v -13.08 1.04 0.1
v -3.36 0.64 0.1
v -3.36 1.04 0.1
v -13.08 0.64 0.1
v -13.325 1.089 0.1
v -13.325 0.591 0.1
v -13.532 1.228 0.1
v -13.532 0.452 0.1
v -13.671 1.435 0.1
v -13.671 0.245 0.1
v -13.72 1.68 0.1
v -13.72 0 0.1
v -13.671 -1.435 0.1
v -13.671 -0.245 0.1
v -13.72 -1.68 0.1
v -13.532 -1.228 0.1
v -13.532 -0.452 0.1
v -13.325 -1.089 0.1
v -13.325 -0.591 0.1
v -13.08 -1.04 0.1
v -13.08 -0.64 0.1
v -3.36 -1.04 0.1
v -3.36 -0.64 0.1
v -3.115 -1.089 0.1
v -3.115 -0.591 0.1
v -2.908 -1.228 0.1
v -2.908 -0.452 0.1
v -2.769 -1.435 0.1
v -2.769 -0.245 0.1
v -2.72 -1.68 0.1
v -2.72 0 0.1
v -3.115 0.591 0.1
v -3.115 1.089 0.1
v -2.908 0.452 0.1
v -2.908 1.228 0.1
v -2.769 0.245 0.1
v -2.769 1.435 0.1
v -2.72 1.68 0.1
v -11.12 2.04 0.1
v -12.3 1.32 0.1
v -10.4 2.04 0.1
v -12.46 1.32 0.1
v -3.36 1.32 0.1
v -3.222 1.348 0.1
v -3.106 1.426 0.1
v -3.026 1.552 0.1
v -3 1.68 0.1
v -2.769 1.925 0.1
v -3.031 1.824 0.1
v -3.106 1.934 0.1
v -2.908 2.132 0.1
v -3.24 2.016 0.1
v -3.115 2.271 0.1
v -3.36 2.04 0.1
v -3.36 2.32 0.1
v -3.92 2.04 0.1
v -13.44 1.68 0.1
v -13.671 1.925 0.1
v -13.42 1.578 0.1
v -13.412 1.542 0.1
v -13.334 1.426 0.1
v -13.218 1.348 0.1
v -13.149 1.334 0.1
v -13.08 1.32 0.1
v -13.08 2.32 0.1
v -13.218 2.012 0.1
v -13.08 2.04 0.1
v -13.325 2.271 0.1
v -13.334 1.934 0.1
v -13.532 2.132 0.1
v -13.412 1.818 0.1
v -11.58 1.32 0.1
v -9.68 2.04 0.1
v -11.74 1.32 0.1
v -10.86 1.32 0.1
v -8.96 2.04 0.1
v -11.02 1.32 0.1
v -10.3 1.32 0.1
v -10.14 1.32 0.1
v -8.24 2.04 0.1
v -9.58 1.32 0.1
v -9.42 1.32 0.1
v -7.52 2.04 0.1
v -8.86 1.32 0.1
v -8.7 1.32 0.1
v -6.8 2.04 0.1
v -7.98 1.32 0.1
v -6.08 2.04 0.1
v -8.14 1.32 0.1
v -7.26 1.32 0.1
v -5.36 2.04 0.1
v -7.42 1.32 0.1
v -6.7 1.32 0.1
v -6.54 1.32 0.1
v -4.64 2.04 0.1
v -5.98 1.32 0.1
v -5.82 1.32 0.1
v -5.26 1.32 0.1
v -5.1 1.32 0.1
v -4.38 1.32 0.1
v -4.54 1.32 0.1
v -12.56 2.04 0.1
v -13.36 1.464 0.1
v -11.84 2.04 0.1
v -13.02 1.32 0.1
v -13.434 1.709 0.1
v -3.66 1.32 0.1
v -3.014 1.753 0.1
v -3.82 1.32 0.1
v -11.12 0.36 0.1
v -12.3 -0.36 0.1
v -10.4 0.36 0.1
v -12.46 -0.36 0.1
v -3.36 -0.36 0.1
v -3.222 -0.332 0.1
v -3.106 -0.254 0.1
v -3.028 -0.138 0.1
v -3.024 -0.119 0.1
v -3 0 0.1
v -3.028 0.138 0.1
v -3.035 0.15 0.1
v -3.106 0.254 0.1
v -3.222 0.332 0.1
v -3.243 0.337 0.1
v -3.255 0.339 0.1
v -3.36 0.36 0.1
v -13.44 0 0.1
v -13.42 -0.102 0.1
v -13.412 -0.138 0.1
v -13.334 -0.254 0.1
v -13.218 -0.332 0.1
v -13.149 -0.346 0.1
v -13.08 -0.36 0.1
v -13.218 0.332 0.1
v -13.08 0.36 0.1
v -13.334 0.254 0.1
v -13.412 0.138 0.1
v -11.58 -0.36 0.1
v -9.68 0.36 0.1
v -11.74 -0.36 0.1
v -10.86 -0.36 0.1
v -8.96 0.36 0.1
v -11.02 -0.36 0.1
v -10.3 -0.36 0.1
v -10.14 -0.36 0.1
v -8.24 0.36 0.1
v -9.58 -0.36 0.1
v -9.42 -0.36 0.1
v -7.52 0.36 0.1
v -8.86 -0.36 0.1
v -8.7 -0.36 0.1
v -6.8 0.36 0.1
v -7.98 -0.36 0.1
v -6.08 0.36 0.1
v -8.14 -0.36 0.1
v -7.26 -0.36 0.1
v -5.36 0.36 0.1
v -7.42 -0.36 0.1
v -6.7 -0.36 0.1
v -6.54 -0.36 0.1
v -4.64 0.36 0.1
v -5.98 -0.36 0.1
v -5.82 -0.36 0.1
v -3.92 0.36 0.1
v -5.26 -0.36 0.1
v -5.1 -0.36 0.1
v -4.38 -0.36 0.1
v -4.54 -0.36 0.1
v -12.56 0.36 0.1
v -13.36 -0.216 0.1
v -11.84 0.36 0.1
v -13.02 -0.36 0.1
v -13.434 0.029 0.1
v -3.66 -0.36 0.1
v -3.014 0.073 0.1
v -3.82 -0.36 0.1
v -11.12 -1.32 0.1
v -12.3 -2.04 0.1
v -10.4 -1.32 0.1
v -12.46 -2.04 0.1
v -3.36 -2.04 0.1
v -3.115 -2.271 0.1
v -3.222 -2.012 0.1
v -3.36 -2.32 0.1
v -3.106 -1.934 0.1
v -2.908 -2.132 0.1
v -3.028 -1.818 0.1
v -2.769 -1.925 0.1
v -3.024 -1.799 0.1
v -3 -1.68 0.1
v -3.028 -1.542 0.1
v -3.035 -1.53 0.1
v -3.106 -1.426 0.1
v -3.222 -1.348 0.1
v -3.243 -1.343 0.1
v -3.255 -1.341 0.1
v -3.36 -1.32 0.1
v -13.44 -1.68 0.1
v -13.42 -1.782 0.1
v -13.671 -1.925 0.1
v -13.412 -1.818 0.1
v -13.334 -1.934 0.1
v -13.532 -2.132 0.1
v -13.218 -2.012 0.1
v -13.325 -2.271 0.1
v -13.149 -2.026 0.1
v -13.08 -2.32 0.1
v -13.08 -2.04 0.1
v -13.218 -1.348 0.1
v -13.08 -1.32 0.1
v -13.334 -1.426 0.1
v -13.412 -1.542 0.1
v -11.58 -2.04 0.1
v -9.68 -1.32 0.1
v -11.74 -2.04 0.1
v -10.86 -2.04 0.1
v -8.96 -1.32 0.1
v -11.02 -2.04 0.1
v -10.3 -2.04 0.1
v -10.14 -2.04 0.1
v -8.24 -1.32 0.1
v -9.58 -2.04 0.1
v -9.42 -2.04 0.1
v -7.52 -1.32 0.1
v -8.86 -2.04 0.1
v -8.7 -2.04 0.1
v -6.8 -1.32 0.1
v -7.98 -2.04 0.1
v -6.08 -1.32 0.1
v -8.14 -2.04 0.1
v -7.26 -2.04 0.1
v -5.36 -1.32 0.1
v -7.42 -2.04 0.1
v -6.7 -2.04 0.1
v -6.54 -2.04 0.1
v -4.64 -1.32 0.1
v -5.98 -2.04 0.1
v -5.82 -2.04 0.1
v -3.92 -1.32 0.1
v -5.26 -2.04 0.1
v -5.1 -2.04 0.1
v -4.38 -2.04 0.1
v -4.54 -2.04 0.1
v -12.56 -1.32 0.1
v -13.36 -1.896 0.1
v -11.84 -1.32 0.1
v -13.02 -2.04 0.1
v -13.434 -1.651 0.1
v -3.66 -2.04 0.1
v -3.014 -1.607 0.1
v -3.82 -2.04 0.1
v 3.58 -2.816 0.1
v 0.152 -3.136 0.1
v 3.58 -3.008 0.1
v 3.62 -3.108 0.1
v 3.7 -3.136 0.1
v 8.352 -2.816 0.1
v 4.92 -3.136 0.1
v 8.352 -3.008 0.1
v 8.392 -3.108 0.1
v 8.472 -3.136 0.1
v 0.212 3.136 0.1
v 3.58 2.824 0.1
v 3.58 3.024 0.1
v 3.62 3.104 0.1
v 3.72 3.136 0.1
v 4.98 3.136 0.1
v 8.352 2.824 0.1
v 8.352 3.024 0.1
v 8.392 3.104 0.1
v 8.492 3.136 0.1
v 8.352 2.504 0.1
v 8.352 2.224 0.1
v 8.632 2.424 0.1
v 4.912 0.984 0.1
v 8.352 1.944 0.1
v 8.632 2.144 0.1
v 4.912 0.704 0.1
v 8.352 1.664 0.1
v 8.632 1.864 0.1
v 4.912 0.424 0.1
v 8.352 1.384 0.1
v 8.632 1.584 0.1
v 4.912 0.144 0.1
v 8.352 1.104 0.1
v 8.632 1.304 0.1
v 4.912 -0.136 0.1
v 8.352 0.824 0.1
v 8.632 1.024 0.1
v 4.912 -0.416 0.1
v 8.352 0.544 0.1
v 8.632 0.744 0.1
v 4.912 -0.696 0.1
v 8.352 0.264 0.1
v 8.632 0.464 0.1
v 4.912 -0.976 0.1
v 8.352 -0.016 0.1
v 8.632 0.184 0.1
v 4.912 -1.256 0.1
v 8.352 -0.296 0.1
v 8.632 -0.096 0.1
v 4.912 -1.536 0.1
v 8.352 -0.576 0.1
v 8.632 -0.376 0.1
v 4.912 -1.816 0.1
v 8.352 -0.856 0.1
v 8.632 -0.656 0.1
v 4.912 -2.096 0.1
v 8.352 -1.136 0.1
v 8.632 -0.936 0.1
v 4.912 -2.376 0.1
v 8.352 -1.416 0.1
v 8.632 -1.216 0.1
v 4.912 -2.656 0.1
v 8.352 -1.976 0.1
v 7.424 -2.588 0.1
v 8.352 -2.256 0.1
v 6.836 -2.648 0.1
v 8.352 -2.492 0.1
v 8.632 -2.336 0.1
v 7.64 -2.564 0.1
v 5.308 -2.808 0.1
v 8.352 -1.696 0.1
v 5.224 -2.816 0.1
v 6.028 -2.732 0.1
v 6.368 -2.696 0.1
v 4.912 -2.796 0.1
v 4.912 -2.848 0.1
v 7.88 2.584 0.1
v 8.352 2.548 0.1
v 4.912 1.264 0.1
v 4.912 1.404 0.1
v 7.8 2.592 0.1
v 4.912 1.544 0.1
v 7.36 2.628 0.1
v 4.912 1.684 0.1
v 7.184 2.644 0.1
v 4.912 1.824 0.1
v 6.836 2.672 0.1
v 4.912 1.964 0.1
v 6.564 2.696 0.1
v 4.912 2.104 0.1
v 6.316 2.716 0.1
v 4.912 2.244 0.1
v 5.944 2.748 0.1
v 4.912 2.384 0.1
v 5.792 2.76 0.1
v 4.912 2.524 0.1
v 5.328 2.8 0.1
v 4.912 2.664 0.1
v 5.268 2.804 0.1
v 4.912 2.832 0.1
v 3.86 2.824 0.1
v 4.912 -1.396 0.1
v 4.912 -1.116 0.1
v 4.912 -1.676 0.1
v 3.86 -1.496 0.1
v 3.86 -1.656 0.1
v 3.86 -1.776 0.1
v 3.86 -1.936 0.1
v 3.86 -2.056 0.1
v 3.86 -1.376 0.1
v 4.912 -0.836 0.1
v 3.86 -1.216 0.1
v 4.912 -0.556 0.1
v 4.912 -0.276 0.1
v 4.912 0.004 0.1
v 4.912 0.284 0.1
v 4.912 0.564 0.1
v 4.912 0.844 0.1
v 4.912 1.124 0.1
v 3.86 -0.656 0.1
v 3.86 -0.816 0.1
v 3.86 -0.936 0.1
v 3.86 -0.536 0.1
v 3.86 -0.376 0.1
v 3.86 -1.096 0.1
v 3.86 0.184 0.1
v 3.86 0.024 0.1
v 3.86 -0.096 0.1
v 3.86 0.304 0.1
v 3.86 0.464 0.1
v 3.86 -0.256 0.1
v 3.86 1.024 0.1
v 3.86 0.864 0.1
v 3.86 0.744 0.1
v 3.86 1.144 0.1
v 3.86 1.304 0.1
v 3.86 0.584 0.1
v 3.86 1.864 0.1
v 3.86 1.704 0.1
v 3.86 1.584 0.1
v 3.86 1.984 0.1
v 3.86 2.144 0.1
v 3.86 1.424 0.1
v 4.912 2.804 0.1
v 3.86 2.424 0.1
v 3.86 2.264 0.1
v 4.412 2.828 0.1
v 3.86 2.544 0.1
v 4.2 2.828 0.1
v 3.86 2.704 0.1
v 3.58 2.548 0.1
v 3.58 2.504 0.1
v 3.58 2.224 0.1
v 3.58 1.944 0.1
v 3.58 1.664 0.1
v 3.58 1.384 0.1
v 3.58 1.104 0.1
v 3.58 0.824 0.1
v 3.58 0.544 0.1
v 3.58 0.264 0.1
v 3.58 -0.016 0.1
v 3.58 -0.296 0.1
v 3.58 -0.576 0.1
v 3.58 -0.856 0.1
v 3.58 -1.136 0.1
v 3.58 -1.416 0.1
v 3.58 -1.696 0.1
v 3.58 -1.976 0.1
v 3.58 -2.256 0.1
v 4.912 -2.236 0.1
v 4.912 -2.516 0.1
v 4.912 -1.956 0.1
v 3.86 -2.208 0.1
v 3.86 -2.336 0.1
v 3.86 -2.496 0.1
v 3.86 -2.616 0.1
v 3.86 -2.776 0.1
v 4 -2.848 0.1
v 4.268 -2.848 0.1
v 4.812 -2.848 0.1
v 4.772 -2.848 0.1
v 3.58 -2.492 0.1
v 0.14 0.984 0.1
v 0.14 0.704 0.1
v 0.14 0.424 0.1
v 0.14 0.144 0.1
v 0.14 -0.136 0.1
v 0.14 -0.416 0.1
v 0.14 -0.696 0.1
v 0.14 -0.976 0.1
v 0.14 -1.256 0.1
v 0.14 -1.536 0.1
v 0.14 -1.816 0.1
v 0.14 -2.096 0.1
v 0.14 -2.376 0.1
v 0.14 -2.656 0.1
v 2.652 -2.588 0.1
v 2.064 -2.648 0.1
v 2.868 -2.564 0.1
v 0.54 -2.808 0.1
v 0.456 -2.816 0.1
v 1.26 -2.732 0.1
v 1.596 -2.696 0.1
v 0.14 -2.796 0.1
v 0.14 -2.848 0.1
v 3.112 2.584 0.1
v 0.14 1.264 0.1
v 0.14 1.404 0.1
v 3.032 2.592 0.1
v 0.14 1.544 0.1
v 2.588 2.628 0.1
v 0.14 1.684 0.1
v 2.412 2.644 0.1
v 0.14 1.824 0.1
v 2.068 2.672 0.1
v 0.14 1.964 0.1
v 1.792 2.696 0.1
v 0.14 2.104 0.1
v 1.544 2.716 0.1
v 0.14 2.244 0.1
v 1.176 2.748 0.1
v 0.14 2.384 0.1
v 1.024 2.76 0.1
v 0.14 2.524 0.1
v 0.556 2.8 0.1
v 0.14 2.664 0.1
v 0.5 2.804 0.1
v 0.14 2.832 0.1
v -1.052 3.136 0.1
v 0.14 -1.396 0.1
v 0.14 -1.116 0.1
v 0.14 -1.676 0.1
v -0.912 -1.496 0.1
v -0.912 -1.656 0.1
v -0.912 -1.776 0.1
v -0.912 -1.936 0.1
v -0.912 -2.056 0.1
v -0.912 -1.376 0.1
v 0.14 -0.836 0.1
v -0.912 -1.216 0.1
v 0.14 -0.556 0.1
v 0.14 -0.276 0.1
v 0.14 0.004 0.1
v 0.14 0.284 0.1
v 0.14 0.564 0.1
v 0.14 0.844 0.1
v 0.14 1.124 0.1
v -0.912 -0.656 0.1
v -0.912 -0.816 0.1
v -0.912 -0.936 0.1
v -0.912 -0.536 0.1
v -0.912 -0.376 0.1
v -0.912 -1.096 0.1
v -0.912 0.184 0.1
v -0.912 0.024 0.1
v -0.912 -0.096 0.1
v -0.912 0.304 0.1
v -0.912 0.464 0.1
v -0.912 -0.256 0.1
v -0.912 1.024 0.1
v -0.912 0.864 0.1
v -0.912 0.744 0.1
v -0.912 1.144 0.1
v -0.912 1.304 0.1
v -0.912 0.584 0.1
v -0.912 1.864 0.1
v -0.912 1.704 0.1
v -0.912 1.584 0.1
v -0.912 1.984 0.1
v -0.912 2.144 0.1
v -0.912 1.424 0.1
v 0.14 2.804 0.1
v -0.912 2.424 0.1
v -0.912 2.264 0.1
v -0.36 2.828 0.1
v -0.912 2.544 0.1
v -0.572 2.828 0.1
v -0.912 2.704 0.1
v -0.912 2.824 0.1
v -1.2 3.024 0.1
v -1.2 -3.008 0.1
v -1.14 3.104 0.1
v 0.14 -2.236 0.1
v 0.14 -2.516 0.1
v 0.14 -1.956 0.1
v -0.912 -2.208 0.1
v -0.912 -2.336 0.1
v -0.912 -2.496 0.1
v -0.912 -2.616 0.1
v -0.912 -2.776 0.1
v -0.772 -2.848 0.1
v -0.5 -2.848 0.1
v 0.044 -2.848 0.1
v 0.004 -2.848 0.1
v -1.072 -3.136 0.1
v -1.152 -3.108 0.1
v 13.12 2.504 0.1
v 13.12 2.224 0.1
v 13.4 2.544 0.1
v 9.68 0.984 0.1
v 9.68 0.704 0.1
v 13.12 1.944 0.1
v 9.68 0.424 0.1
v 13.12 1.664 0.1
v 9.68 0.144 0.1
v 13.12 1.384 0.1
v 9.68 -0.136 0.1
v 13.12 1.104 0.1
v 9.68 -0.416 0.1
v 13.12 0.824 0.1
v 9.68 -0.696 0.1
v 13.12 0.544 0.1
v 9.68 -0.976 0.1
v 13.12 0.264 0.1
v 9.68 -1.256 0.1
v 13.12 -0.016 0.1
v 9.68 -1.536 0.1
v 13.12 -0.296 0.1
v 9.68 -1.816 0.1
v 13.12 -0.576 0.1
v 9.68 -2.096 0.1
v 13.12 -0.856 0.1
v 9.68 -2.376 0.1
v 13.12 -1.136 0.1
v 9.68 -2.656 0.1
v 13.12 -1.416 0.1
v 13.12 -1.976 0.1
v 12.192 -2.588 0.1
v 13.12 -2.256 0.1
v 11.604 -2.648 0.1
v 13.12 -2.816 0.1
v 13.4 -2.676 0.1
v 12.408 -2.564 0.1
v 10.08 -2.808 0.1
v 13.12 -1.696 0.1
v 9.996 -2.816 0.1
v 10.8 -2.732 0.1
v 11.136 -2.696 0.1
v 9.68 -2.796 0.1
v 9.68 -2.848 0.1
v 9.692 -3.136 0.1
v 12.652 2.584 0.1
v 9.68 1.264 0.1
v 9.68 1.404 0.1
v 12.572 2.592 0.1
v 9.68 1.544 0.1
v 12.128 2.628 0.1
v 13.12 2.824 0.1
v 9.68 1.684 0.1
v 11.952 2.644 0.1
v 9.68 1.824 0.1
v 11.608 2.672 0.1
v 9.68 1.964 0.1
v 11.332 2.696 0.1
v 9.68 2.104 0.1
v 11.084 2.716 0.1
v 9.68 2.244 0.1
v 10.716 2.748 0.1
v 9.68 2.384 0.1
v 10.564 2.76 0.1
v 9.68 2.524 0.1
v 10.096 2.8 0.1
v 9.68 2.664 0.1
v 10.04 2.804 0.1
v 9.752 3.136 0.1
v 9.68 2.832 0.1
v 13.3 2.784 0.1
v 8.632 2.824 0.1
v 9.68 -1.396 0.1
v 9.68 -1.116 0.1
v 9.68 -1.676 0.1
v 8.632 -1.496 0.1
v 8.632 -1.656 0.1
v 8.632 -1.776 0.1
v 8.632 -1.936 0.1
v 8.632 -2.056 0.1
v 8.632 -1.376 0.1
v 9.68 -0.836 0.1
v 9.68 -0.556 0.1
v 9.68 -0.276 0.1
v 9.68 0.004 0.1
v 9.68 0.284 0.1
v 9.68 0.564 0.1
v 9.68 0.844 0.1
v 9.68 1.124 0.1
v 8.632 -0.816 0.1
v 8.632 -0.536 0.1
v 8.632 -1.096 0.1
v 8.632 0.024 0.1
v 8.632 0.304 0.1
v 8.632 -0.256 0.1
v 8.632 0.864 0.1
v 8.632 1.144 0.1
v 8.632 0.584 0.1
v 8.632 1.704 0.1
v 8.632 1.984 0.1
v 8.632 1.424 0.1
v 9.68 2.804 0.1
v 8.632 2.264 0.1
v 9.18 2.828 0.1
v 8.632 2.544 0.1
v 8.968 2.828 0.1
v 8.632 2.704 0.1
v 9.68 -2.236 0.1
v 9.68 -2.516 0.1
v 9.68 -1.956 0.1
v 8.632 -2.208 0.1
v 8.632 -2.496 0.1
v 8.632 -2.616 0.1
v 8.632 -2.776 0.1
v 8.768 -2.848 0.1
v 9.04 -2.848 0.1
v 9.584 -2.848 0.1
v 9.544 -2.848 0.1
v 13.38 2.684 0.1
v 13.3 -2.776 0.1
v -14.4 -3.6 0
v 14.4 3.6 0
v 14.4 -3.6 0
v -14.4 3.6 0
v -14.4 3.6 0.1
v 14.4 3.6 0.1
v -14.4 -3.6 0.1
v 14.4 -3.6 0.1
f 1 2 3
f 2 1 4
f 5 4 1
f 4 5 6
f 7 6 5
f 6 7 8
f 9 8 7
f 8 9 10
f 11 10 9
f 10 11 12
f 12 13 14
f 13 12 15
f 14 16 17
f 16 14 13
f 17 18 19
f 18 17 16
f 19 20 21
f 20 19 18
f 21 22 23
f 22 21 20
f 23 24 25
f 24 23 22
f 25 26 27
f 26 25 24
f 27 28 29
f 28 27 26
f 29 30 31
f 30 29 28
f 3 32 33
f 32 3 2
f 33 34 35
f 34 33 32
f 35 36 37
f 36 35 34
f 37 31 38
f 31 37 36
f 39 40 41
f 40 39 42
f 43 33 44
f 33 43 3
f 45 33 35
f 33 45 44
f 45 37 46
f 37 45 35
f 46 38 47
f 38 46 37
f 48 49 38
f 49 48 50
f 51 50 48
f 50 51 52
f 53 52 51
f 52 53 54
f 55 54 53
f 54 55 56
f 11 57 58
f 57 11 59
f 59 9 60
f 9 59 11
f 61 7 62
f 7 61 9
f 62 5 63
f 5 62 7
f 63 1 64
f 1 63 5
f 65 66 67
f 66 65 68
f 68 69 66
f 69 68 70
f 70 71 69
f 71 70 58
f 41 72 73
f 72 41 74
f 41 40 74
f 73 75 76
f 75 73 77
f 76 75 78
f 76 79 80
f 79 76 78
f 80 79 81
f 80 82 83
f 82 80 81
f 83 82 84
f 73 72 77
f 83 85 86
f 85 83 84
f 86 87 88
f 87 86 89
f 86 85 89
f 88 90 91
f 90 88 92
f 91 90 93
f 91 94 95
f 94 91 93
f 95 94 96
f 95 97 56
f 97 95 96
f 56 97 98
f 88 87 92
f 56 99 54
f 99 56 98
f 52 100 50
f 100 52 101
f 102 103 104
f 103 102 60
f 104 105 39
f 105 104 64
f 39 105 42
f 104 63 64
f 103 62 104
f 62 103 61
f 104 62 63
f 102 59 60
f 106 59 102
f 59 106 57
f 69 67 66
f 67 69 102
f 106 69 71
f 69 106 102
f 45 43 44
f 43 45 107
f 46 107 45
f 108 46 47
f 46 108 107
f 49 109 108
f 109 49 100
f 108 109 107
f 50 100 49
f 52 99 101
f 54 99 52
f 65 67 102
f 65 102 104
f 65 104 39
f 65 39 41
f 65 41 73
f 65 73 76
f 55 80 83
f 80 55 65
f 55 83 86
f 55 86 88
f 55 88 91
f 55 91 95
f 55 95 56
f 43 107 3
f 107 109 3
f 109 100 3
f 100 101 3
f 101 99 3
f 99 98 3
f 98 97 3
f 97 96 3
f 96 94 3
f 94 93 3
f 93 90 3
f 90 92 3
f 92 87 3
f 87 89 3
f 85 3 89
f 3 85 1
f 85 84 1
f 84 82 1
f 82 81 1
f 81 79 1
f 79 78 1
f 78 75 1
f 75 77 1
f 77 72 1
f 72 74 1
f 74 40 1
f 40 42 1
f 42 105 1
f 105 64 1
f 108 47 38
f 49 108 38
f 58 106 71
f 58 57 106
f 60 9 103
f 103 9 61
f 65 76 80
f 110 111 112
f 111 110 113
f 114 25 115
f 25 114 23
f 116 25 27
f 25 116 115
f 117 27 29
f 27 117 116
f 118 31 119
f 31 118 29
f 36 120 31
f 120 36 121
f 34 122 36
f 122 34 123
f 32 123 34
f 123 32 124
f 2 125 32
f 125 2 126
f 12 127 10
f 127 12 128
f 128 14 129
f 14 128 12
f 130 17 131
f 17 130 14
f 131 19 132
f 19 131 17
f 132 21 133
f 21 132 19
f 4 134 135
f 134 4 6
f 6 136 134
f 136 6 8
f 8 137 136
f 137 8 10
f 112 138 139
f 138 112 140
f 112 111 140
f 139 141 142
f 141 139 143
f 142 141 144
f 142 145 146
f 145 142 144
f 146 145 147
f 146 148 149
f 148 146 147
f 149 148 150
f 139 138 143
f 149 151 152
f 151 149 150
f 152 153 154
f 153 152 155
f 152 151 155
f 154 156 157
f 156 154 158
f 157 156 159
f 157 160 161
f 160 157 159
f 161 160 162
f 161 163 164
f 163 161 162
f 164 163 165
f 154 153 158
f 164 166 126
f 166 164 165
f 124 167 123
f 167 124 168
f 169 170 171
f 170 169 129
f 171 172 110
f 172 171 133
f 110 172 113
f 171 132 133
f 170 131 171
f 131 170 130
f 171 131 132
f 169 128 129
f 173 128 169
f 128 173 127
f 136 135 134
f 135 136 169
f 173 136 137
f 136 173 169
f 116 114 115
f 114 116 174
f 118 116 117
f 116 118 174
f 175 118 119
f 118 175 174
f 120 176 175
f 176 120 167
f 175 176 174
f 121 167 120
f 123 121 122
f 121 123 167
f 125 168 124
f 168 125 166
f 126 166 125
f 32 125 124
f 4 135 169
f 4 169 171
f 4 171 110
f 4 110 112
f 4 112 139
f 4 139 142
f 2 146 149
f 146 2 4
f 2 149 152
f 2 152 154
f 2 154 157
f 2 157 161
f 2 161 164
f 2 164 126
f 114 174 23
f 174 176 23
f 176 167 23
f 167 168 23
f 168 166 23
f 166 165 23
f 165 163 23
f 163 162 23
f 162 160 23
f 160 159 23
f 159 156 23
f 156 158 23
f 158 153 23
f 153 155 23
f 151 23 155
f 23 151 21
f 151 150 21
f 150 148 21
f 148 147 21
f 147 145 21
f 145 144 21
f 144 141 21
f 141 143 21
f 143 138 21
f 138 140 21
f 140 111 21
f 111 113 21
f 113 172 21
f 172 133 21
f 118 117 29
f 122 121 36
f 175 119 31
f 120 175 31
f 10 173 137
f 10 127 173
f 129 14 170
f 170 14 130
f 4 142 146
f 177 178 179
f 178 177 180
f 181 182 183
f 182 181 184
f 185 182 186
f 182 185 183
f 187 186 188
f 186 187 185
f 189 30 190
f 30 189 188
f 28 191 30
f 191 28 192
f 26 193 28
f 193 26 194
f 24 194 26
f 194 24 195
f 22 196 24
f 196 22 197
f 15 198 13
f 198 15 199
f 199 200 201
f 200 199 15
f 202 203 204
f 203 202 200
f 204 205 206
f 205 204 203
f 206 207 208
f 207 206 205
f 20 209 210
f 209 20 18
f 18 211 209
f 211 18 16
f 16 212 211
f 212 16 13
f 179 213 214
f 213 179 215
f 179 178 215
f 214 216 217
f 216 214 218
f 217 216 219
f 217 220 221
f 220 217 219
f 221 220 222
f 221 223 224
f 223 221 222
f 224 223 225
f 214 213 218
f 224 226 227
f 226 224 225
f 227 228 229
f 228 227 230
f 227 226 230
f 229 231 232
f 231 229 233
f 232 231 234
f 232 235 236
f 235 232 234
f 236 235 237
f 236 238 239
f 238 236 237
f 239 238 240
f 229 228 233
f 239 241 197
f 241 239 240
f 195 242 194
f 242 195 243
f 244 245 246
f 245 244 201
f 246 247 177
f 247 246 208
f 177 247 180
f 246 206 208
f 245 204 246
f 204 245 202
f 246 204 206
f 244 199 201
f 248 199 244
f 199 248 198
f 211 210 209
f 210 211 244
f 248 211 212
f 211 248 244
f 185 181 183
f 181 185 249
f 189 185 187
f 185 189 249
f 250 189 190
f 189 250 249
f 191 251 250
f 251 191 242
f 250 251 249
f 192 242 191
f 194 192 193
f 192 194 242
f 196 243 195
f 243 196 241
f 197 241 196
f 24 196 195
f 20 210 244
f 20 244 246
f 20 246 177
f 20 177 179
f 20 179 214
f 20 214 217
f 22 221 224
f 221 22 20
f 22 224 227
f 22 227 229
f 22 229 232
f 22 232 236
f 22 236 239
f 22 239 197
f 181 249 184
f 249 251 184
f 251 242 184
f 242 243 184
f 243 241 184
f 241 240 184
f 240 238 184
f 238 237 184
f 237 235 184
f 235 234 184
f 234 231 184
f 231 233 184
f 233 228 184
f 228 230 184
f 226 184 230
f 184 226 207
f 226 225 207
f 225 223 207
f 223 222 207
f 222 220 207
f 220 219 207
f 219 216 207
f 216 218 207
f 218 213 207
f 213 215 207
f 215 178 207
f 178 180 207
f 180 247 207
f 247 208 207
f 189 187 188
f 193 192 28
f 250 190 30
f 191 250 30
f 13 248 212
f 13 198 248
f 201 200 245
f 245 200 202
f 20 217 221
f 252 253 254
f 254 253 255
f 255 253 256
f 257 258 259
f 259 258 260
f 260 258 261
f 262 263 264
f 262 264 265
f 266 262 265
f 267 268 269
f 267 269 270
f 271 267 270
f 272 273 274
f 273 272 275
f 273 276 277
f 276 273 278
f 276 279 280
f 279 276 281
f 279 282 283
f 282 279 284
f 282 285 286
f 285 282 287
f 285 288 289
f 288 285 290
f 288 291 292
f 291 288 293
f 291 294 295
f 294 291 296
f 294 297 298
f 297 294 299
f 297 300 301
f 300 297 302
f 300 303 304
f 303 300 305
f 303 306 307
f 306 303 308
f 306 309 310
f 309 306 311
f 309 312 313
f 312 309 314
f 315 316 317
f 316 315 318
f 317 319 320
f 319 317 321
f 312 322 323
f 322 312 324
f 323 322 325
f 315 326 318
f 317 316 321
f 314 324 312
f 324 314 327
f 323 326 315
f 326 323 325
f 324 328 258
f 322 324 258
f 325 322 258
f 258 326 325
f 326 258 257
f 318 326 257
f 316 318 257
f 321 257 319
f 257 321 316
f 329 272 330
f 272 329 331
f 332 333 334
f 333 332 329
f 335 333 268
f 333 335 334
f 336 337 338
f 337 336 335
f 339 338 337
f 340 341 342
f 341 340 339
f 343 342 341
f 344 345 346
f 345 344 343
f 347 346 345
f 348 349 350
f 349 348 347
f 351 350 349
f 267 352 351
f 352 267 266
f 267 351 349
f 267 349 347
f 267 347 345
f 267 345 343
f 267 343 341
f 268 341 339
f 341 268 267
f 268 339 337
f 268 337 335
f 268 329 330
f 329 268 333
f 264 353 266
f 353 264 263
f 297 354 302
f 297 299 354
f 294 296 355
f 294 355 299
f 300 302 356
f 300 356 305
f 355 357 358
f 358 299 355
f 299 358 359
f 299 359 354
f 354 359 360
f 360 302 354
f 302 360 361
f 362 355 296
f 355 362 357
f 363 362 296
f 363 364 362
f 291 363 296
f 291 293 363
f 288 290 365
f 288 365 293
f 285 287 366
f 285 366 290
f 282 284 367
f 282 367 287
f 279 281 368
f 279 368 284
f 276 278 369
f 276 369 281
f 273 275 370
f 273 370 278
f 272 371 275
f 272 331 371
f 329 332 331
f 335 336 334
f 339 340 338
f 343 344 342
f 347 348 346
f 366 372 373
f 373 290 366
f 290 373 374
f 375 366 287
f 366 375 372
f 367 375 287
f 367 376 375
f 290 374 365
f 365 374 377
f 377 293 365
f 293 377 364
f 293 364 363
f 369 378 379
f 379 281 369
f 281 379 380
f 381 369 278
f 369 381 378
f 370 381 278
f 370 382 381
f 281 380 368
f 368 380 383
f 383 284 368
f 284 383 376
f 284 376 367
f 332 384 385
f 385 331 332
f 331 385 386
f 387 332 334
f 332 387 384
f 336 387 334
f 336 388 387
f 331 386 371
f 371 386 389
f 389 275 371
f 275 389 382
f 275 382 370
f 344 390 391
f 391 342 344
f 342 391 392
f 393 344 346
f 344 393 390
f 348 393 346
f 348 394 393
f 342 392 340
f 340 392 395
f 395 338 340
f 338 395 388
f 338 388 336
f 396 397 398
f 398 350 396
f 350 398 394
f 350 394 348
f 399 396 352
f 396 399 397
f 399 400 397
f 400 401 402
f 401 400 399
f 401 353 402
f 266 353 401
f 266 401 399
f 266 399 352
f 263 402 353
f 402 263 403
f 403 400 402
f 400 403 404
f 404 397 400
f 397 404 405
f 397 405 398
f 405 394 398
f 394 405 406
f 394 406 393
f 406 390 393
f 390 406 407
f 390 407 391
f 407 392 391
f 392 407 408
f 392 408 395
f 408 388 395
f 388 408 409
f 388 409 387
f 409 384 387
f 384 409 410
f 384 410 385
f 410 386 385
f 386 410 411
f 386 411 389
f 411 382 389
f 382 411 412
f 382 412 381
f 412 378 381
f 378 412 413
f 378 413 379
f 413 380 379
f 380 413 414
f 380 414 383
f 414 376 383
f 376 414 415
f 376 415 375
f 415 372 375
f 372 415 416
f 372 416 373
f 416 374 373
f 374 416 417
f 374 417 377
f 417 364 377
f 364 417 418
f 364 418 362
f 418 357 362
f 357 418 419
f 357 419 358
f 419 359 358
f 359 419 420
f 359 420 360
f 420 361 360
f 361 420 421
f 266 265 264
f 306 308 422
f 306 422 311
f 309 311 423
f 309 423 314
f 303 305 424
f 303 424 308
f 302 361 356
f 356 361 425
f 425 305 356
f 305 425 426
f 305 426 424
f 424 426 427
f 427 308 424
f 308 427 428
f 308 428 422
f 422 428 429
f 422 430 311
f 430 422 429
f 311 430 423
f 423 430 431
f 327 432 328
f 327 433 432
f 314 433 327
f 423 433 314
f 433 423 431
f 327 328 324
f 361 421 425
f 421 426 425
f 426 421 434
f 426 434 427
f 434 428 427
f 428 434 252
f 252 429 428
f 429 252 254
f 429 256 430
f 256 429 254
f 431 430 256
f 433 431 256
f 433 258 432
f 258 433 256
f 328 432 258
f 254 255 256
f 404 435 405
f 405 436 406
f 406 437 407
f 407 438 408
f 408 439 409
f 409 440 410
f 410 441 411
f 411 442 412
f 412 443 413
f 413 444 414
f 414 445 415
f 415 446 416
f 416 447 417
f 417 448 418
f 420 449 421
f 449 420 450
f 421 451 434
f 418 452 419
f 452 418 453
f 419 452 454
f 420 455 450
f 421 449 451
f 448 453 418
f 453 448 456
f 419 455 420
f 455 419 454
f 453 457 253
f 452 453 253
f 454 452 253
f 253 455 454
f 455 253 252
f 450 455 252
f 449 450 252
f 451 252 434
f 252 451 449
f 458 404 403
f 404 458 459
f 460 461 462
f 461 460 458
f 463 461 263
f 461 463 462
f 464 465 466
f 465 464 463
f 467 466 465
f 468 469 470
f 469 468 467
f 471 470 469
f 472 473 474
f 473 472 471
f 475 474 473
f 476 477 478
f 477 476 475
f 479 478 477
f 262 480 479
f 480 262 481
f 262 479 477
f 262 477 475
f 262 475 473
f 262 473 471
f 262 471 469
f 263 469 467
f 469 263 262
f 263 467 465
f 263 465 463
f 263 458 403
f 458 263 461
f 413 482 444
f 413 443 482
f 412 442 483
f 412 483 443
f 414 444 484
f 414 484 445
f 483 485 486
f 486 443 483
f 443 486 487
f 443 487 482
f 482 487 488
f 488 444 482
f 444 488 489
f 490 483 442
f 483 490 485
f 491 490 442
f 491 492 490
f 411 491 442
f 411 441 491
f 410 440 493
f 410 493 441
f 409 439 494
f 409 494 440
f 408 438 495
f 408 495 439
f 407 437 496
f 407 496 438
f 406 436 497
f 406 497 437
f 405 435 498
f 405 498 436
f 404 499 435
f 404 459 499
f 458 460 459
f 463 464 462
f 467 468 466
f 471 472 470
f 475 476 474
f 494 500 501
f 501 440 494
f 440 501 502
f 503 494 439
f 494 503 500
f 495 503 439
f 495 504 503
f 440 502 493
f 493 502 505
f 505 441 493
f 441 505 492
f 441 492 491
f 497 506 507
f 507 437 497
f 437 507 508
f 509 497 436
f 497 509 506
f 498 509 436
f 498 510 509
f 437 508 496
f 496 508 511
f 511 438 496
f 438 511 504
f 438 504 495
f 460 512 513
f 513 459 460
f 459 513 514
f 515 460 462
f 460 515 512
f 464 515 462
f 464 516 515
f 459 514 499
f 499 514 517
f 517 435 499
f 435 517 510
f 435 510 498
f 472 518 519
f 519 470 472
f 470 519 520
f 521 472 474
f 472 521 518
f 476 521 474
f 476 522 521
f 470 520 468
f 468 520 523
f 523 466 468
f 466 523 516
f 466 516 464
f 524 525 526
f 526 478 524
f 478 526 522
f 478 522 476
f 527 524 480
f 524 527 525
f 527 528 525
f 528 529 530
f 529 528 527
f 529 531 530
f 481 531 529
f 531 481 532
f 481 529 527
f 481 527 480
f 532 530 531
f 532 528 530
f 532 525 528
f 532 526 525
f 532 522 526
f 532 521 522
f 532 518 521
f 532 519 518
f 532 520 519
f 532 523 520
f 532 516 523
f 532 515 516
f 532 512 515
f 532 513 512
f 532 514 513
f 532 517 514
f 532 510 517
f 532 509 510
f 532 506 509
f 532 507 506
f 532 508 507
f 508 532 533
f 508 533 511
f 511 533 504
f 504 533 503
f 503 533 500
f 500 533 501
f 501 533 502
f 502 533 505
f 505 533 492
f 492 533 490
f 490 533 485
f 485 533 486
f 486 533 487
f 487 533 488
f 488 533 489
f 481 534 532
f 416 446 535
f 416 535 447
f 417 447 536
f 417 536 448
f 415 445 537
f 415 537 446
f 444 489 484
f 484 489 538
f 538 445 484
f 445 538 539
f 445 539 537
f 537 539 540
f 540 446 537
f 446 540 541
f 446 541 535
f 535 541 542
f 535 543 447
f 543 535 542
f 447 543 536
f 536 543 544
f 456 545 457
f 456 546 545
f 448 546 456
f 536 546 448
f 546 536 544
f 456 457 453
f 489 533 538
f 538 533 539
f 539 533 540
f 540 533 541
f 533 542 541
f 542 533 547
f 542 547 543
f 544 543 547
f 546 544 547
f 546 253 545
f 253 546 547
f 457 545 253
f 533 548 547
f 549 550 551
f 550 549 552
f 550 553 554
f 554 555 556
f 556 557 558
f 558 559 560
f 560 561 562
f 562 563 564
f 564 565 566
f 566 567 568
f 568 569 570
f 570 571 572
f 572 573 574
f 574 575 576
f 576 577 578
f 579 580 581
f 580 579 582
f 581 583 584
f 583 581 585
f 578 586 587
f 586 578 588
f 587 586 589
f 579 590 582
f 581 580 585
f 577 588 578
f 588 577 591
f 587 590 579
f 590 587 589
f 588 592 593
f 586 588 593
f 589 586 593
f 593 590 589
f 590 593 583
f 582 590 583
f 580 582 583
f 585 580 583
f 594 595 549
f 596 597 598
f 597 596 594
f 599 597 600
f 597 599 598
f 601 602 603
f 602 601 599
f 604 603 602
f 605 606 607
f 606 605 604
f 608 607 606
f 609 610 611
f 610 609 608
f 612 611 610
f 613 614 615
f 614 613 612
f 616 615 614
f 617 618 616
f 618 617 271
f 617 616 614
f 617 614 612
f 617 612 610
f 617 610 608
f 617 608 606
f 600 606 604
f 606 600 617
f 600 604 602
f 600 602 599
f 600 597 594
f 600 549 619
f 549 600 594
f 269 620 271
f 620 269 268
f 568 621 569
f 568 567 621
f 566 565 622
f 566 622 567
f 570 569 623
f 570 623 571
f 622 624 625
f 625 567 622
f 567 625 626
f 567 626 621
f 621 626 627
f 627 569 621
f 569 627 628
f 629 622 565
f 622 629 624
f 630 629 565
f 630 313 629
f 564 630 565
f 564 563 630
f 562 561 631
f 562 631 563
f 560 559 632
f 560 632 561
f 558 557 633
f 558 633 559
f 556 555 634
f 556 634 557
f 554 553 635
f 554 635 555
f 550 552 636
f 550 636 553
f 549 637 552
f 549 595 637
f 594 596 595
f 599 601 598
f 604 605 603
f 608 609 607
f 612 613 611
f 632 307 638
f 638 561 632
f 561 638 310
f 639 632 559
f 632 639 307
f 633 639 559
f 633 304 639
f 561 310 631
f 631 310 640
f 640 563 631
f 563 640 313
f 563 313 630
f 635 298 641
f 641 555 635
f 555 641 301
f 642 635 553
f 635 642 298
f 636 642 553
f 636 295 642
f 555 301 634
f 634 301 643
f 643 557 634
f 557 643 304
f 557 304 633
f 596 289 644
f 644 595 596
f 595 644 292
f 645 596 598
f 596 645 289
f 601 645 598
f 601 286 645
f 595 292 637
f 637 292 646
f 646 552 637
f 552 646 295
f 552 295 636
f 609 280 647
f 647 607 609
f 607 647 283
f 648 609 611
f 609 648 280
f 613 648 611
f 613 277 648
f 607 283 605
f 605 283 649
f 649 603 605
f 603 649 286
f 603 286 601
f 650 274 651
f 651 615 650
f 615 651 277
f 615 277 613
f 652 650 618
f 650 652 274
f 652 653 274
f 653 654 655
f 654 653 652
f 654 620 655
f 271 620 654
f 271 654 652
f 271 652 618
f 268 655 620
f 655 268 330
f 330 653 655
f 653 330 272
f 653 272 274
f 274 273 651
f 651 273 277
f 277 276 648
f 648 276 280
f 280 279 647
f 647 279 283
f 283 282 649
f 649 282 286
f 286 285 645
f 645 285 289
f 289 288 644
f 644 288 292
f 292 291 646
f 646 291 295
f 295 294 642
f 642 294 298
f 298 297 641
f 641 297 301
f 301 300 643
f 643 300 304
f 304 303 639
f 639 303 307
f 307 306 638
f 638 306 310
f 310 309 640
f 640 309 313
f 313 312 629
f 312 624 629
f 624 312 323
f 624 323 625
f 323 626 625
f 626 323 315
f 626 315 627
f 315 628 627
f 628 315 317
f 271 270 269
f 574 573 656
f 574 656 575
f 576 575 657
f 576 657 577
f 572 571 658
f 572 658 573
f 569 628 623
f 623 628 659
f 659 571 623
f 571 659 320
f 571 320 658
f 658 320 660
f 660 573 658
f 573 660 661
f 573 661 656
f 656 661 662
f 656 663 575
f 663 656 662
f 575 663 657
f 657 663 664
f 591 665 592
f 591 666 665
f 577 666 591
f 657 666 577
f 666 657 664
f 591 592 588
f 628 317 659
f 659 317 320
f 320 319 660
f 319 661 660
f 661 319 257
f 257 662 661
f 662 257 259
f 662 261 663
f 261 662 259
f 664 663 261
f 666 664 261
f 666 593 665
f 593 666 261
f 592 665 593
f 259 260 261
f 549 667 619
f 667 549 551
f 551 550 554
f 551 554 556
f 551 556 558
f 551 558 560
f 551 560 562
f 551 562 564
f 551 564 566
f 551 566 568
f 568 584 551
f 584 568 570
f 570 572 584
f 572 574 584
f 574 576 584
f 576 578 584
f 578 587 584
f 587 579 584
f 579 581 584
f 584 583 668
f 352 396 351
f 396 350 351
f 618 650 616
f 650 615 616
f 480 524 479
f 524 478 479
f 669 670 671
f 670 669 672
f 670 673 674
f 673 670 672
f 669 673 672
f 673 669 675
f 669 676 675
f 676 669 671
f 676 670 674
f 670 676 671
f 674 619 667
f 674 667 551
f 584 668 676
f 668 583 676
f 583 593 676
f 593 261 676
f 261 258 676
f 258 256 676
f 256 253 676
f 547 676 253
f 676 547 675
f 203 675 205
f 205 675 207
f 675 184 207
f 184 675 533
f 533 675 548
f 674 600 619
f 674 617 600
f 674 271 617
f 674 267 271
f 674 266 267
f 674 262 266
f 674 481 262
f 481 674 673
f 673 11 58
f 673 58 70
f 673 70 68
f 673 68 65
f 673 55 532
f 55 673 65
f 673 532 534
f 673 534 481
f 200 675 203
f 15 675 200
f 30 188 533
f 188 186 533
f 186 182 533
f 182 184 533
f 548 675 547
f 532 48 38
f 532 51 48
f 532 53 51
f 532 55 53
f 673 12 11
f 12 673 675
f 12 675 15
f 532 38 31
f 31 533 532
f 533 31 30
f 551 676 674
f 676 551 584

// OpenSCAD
use <../lib.scad>
use <../p/box5-12.scad>
use <s/4188571cs01.scad>
use <s/4188571cs02.scad>
function ldraw_lib__4188571c() = [
// 0 Sticker  0.9 x  3.6 with Vertical and Horizontal Grille
// 0 Name: 4188571c.dat
// 0 Author: Gerald Lasser [GeraldLasser]
// 0 !LDRAW_ORG Part UPDATE 2023-04
// 0 !LICENSE Licensed under CC BY 4.0 : see CAreadme.txt
// 
// 0 BFC CERTIFY CCW
  [0,"BFC","CERTIFY"],
  [0,"BFC","CCW"],
// 
// 0 !KEYWORDS Bricklink 10020stk01, Bricklink 10022stk01, Bricklink 10025stk01
// 0 !KEYWORDS Brickowl 672398, Brickowl 924347, Rebrickable 43822
// 0 !KEYWORDS Rebrickable 45443, Set 10020, Set 10022, Set 10025
// 
// 0 !HISTORY 2023-08-25 [OrionP] Official Update 2023-04
// 
// 
// 1 16 -20.55 -.25 0 1 0 0 0 1 0 0 0 1 s\4188571cs01.dat
  [1,16,-20.55,-.25,0,1,0,0,0,1,0,0,0,1, ldraw_lib__s__4188571cs01()],
// 1 16 15.5 -.25 0 1 0 0 0 1 0 0 0 1 s\4188571cs02.dat
  [1,16,15.5,-.25,0,1,0,0,0,1,0,0,0,1, ldraw_lib__s__4188571cs02()],
// 
// 1 16 0 -0.25 0 36 0 0 0 0.25 0 0 0 9 box5-12.dat
  [1,16,0,-0.25,0,36,0,0,0,0.25,0,0,0,9, ldraw_lib__box5_12()],
// 
// 3 16 36 -.25 9 33.25 -.25 6.96 33.45 -.25 6.71
  [3,16,36,-.25,9,33.25,-.25,6.96,33.45,-.25,6.71],
// 3 16 36 -.25 9 33.45 -.25 6.71 33.5 -.25 6.36
  [3,16,36,-.25,9,33.45,-.25,6.71,33.5,-.25,6.36],
// 3 16 33.5 -.25 -6.69 33.25 -.25 -6.94 36 -.25 -9
  [3,16,33.5,-.25,-6.69,33.25,-.25,-6.94,36,-.25,-9],
// 3 16 33.25 -.25 -6.94 32.8 -.25 -7.04 36 -.25 -9
  [3,16,33.25,-.25,-6.94,32.8,-.25,-7.04,36,-.25,-9],
// 3 16 32.8 -.25 -7.04 24.23 -.25 -7.84 36 -.25 -9
  [3,16,32.8,-.25,-7.04,24.23,-.25,-7.84,36,-.25,-9],
// 3 16 24.23 -.25 -7.84 21.18 -.25 -7.84 36 -.25 -9
  [3,16,24.23,-.25,-7.84,21.18,-.25,-7.84,36,-.25,-9],
// 3 16 21.18 -.25 -7.84 12.3 -.25 -7.84 36 -.25 -9
  [3,16,21.18,-.25,-7.84,12.3,-.25,-7.84,36,-.25,-9],
// 3 16 12.3 -.25 -7.84 9.25 -.25 -7.84 36 -.25 -9
  [3,16,12.3,-.25,-7.84,9.25,-.25,-7.84,36,-.25,-9],
// 3 16 9.25 -.25 -7.84 .38 -.25 -7.84 36 -.25 -9
  [3,16,9.25,-.25,-7.84,.38,-.25,-7.84,36,-.25,-9],
// 4 16 36 -.25 -9 .38 -.25 -7.84 -2.68 -.25 -7.84 -36 -.25 -9
  [4,16,36,-.25,-9,.38,-.25,-7.84,-2.68,-.25,-7.84,-36,-.25,-9],
// 3 16 -33.831 -.25 -5.331 -36 -.25 -9 -33.312 -.25 -5.678
  [3,16,-33.831,-.25,-5.331,-36,-.25,-9,-33.312,-.25,-5.678],
// 3 16 -33.312 -.25 -5.678 -36 -.25 -9 -32.7 -.25 -5.8
  [3,16,-33.312,-.25,-5.678,-36,-.25,-9,-32.7,-.25,-5.8],
// 4 16 -8.4 -.25 -5.8 -32.7 -.25 -5.8 -36 -.25 -9 -3 -.25 -7.52
  [4,16,-8.4,-.25,-5.8,-32.7,-.25,-5.8,-36,-.25,-9,-3,-.25,-7.52],
// 3 16 -3 -.25 -7.52 -36 -.25 -9 -2.88 -.25 -7.77
  [3,16,-3,-.25,-7.52,-36,-.25,-9,-2.88,-.25,-7.77],
// 3 16 36 -.25 9 32.8 -.25 7.06 33.25 -.25 6.96
  [3,16,36,-.25,9,32.8,-.25,7.06,33.25,-.25,6.96],
// 3 16 36 -.25 9 24.38 -.25 7.84 32.8 -.25 7.06
  [3,16,36,-.25,9,24.38,-.25,7.84,32.8,-.25,7.06],
// 3 16 36 -.25 9 21.23 -.25 7.84 24.38 -.25 7.84
  [3,16,36,-.25,9,21.23,-.25,7.84,24.38,-.25,7.84],
// 3 16 36 -.25 9 12.45 -.25 7.84 21.23 -.25 7.84
  [3,16,36,-.25,9,12.45,-.25,7.84,21.23,-.25,7.84],
// 3 16 36 -.25 9 9.3 -.25 7.84 12.45 -.25 7.84
  [3,16,36,-.25,9,9.3,-.25,7.84,12.45,-.25,7.84],
// 3 16 36 -.25 9 .53 -.25 7.84 9.3 -.25 7.84
  [3,16,36,-.25,9,.53,-.25,7.84,9.3,-.25,7.84],
// 4 16 -2.63 -.25 7.84 .53 -.25 7.84 36 -.25 9 -36 -.25 9
  [4,16,-2.63,-.25,7.84,.53,-.25,7.84,36,-.25,9,-36,-.25,9],
// 3 16 -36 -.25 9 -34.3 -.25 4.2 -34.178 -.25 4.812
  [3,16,-36,-.25,9,-34.3,-.25,4.2,-34.178,-.25,4.812],
// 3 16 -36 -.25 9 -34.178 -.25 4.812 -33.831 -.25 5.331
  [3,16,-36,-.25,9,-34.178,-.25,4.812,-33.831,-.25,5.331],
// 3 16 -36 -.25 9 -33.831 -.25 5.331 -33.312 -.25 5.678
  [3,16,-36,-.25,9,-33.831,-.25,5.331,-33.312,-.25,5.678],
// 3 16 -36 -.25 9 -33.312 -.25 5.678 -32.7 -.25 5.8
  [3,16,-36,-.25,9,-33.312,-.25,5.678,-32.7,-.25,5.8],
// 4 16 -36 -.25 9 -32.7 -.25 5.8 -8.4 -.25 5.8 -3 -.25 7.56
  [4,16,-36,-.25,9,-32.7,-.25,5.8,-8.4,-.25,5.8,-3,-.25,7.56],
// 3 16 -36 -.25 9 -3 -.25 7.56 -2.85 -.25 7.76
  [3,16,-36,-.25,9,-3,-.25,7.56,-2.85,-.25,7.76],
// 3 16 -36 -.25 9 -2.85 -.25 7.76 -2.63 -.25 7.84
  [3,16,-36,-.25,9,-2.85,-.25,7.76,-2.63,-.25,7.84],
// 3 16 -34.178 -.25 -4.812 -36 -.25 -9 -33.831 -.25 -5.331
  [3,16,-34.178,-.25,-4.812,-36,-.25,-9,-33.831,-.25,-5.331],
// 3 16 -34.3 -.25 -4.2 -36 -.25 -9 -34.178 -.25 -4.812
  [3,16,-34.3,-.25,-4.2,-36,-.25,-9,-34.178,-.25,-4.812],
// 3 16 -6.8 -.25 -4.2 -6.922 -.25 -4.812 -3 -.25 -7.52
  [3,16,-6.8,-.25,-4.2,-6.922,-.25,-4.812,-3,-.25,-7.52],
// 3 16 -6.922 -.25 -4.812 -7.269 -.25 -5.331 -3 -.25 -7.52
  [3,16,-6.922,-.25,-4.812,-7.269,-.25,-5.331,-3,-.25,-7.52],
// 3 16 -7.269 -.25 -5.331 -7.788 -.25 -5.678 -3 -.25 -7.52
  [3,16,-7.269,-.25,-5.331,-7.788,-.25,-5.678,-3,-.25,-7.52],
// 3 16 -7.788 -.25 -5.678 -8.4 -.25 -5.8 -3 -.25 -7.52
  [3,16,-7.788,-.25,-5.678,-8.4,-.25,-5.8,-3,-.25,-7.52],
// 3 16 -2.88 -.25 -7.77 -36 -.25 -9 -2.68 -.25 -7.84
  [3,16,-2.88,-.25,-7.77,-36,-.25,-9,-2.68,-.25,-7.84],
// 3 16 -3 -.25 7.56 -6.922 -.25 4.812 -6.8 -.25 4.2
  [3,16,-3,-.25,7.56,-6.922,-.25,4.812,-6.8,-.25,4.2],
// 3 16 -3 -.25 7.56 -7.269 -.25 5.331 -6.922 -.25 4.812
  [3,16,-3,-.25,7.56,-7.269,-.25,5.331,-6.922,-.25,4.812],
// 3 16 -3 -.25 7.56 -7.788 -.25 5.678 -7.269 -.25 5.331
  [3,16,-3,-.25,7.56,-7.788,-.25,5.678,-7.269,-.25,5.331],
// 3 16 -3 -.25 7.56 -8.4 -.25 5.8 -7.788 -.25 5.678
  [3,16,-3,-.25,7.56,-8.4,-.25,5.8,-7.788,-.25,5.678],
// 4 16 -36 -.25 -9 -34.3 -.25 0 -34.3 -.25 4.2 -36 -.25 9
  [4,16,-36,-.25,-9,-34.3,-.25,0,-34.3,-.25,4.2,-36,-.25,9],
// 3 16 -34.3 -.25 0 -36 -.25 -9 -34.3 -.25 -4.2
  [3,16,-34.3,-.25,0,-36,-.25,-9,-34.3,-.25,-4.2],
// 3 16 -3 -.25 7.56 -6.8 -.25 4.2 -6.8 -.25 0
  [3,16,-3,-.25,7.56,-6.8,-.25,4.2,-6.8,-.25,0],
// 4 16 -6.8 -.25 -4.2 -3 -.25 -7.52 -3 -.25 7.56 -6.8 -.25 0
  [4,16,-6.8,-.25,-4.2,-3,-.25,-7.52,-3,-.25,7.56,-6.8,-.25,0],
// 4 16 33.5 -.25 -6.69 36 -.25 -9 36 -.25 9 33.5 -.25 6.36
  [4,16,33.5,-.25,-6.69,36,-.25,-9,36,-.25,9,33.5,-.25,6.36],
// 
];
module ldraw_lib__4188571c(step=0, col=false, unit=2/5, alt=false, line=0.2, solid=!$preview)
    makepoly(ldraw_lib__4188571c(), step=step, col=col, unit=unit, alt=alt, line=line, solid=solid);
ldraw_lib__4188571c(line=0.2);
